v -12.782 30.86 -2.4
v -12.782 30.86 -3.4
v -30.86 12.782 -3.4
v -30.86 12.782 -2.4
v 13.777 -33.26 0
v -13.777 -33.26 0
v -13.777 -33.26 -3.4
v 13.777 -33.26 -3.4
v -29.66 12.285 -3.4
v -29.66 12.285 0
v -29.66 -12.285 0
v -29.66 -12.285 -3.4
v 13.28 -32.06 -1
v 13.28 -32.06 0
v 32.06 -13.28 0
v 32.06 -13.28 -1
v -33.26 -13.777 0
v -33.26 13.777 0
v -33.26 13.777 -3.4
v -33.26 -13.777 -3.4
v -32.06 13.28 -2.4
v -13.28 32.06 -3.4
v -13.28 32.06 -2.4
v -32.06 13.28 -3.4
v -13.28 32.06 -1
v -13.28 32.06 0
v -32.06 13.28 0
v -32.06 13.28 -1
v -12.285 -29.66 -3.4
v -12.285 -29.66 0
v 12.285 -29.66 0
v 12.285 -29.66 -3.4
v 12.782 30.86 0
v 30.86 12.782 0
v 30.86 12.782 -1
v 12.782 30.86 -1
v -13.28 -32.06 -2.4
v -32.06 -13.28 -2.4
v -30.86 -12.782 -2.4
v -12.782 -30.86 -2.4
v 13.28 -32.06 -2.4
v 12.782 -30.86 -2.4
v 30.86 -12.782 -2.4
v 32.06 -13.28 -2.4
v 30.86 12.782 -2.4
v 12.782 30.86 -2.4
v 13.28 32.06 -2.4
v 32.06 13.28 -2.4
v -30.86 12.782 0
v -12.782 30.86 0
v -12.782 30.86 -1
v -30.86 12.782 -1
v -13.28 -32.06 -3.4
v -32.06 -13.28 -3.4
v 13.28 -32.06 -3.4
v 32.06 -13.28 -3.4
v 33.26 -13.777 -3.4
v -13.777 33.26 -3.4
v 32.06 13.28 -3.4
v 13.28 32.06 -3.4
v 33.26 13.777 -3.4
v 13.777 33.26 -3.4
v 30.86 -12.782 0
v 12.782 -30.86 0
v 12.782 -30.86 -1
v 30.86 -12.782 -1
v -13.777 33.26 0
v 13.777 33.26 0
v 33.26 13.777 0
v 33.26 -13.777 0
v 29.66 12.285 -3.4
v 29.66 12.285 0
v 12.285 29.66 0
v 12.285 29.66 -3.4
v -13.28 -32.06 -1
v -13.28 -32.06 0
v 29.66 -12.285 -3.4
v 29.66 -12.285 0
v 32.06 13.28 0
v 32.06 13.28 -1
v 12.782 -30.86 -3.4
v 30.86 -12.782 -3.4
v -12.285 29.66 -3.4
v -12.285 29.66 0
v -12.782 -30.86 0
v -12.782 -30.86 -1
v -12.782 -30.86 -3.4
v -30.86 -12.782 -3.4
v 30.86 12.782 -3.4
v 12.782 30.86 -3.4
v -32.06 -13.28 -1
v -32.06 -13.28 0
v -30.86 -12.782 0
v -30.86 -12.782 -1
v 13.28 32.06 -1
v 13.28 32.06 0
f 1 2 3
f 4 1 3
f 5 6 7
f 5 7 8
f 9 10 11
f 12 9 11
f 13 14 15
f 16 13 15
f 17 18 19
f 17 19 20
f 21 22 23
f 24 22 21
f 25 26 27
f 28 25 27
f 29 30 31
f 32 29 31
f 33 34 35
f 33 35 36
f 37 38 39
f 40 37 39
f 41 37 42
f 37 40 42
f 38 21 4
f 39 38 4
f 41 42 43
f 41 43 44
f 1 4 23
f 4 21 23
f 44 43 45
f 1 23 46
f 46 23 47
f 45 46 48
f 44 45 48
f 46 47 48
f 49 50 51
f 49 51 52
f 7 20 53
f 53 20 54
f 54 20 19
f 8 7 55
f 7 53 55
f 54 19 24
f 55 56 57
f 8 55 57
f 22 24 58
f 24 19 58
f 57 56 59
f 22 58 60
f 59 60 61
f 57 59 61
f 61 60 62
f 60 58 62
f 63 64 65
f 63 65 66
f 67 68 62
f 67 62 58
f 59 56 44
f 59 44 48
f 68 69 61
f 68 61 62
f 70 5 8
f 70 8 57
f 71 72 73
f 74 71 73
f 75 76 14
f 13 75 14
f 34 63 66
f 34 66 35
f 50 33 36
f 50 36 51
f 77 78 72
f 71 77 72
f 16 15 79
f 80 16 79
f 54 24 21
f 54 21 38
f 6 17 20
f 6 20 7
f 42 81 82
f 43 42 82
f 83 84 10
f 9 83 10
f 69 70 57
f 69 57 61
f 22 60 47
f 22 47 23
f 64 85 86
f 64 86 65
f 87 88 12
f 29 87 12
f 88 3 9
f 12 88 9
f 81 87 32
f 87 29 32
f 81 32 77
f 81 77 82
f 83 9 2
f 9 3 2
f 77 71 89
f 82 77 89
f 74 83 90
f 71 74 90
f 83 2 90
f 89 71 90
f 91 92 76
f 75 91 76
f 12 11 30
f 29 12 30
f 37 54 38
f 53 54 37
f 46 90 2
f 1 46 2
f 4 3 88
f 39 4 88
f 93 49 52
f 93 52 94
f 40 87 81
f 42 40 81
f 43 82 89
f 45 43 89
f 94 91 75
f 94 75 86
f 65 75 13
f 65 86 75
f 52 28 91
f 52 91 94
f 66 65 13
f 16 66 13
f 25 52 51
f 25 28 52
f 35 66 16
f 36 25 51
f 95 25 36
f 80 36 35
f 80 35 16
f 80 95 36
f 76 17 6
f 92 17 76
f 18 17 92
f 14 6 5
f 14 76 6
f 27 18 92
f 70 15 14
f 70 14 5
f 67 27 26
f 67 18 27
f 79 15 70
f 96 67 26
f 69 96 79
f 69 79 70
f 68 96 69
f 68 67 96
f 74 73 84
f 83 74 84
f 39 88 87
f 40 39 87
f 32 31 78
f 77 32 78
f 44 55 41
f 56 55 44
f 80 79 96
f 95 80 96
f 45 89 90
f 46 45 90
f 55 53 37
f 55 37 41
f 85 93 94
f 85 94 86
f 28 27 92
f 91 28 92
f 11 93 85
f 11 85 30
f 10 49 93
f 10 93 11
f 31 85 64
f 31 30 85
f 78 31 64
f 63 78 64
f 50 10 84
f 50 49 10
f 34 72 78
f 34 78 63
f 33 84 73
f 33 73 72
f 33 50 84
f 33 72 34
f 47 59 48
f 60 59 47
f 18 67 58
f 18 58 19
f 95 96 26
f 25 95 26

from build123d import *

# Parameters (mm, degrees)
EXTRUDE_2_DEPTH     = 3.4
CUT_EXTRUDE_3_DEPTH = 1


with BuildPart() as part:
    # 스케치7 → 보스-돌출2 (new body)
    with BuildSketch(Plane.XY):
        Polygon((-33.25966317, -13.776603565), (-13.776603565, -33.25966317), (13.776603565, -33.25966317), (33.25966317, -13.776603565), (33.25966317, 13.776603565), (13.776603565, 33.25966317), (-13.776603565, 33.25966317), (-33.25966317, 13.776603565), align=None)
        Polygon((-13.27954729, -32.05966317), (13.27954729, -32.05966317), (32.05966317, -13.27954729), (32.05966317, 13.27954729), (13.27954729, 32.05966317), (-13.27954729, 32.05966317), (-32.05966317, 13.27954729), (-32.05966317, -13.27954729), align=None, mode=Mode.SUBTRACT)
        Polygon((-32.05966317, -13.27954729), (-13.27954729, -32.05966317), (13.27954729, -32.05966317), (32.05966317, -13.27954729), (32.05966317, 13.27954729), (13.27954729, 32.05966317), (-13.27954729, 32.05966317), (-32.05966317, 13.27954729), align=None)
        Polygon((-12.782491015, -30.85966317), (12.782491015, -30.85966317), (30.85966317, -12.782491015), (30.85966317, 12.782491015), (12.782491015, 30.85966317), (-12.782491015, 30.85966317), (-30.85966317, 12.782491015), (-30.85966317, -12.782491015), align=None, mode=Mode.SUBTRACT)
        Polygon((-30.85966317, -12.782491015), (-12.782491015, -30.85966317), (12.782491015, -30.85966317), (30.85966317, -12.782491015), (30.85966317, 12.782491015), (12.782491015, 30.85966317), (-12.782491015, 30.85966317), (-30.85966317, 12.782491015), align=None)
        Polygon((-12.285434741, -29.65966317), (12.285434741, -29.65966317), (29.65966317, -12.285434741), (29.65966317, 12.285434741), (12.285434741, 29.65966317), (-12.285434741, 29.65966317), (-29.65966317, 12.285434741), (-29.65966317, -12.285434741), align=None, mode=Mode.SUBTRACT)
    extrude(amount=-EXTRUDE_2_DEPTH)

    # 스케치9 → 컷-돌출3 (cut)
    with BuildSketch(Plane.XY):
        Polygon((13.27954729, -32.05966317), (32.05966317, -13.27954729), (32.05966317, 13.27954729), (13.27954729, 32.05966317), (-13.27954729, 32.05966317), (-32.05966317, 13.27954729), (-32.05966317, -13.27954729), (-13.27954729, -32.05966317), align=None)
        Polygon((12.782491015, -30.85966317), (30.85966317, -12.782491015), (30.85966317, 12.782491015), (12.782491015, 30.85966317), (-12.782491015, 30.85966317), (-30.85966317, 12.782491015), (-30.85966317, -12.782491015), (-12.782491015, -30.85966317), align=None, mode=Mode.SUBTRACT)
    cut_extrude_3 = extrude(amount=-CUT_EXTRUDE_3_DEPTH, mode=Mode.SUBTRACT)

    # 대칭 복사4: 컷-돌출3 across plane
    add(cut_extrude_3.mirror(Plane.XY.offset(-1.7)), mode=Mode.SUBTRACT)


solid = part.part
